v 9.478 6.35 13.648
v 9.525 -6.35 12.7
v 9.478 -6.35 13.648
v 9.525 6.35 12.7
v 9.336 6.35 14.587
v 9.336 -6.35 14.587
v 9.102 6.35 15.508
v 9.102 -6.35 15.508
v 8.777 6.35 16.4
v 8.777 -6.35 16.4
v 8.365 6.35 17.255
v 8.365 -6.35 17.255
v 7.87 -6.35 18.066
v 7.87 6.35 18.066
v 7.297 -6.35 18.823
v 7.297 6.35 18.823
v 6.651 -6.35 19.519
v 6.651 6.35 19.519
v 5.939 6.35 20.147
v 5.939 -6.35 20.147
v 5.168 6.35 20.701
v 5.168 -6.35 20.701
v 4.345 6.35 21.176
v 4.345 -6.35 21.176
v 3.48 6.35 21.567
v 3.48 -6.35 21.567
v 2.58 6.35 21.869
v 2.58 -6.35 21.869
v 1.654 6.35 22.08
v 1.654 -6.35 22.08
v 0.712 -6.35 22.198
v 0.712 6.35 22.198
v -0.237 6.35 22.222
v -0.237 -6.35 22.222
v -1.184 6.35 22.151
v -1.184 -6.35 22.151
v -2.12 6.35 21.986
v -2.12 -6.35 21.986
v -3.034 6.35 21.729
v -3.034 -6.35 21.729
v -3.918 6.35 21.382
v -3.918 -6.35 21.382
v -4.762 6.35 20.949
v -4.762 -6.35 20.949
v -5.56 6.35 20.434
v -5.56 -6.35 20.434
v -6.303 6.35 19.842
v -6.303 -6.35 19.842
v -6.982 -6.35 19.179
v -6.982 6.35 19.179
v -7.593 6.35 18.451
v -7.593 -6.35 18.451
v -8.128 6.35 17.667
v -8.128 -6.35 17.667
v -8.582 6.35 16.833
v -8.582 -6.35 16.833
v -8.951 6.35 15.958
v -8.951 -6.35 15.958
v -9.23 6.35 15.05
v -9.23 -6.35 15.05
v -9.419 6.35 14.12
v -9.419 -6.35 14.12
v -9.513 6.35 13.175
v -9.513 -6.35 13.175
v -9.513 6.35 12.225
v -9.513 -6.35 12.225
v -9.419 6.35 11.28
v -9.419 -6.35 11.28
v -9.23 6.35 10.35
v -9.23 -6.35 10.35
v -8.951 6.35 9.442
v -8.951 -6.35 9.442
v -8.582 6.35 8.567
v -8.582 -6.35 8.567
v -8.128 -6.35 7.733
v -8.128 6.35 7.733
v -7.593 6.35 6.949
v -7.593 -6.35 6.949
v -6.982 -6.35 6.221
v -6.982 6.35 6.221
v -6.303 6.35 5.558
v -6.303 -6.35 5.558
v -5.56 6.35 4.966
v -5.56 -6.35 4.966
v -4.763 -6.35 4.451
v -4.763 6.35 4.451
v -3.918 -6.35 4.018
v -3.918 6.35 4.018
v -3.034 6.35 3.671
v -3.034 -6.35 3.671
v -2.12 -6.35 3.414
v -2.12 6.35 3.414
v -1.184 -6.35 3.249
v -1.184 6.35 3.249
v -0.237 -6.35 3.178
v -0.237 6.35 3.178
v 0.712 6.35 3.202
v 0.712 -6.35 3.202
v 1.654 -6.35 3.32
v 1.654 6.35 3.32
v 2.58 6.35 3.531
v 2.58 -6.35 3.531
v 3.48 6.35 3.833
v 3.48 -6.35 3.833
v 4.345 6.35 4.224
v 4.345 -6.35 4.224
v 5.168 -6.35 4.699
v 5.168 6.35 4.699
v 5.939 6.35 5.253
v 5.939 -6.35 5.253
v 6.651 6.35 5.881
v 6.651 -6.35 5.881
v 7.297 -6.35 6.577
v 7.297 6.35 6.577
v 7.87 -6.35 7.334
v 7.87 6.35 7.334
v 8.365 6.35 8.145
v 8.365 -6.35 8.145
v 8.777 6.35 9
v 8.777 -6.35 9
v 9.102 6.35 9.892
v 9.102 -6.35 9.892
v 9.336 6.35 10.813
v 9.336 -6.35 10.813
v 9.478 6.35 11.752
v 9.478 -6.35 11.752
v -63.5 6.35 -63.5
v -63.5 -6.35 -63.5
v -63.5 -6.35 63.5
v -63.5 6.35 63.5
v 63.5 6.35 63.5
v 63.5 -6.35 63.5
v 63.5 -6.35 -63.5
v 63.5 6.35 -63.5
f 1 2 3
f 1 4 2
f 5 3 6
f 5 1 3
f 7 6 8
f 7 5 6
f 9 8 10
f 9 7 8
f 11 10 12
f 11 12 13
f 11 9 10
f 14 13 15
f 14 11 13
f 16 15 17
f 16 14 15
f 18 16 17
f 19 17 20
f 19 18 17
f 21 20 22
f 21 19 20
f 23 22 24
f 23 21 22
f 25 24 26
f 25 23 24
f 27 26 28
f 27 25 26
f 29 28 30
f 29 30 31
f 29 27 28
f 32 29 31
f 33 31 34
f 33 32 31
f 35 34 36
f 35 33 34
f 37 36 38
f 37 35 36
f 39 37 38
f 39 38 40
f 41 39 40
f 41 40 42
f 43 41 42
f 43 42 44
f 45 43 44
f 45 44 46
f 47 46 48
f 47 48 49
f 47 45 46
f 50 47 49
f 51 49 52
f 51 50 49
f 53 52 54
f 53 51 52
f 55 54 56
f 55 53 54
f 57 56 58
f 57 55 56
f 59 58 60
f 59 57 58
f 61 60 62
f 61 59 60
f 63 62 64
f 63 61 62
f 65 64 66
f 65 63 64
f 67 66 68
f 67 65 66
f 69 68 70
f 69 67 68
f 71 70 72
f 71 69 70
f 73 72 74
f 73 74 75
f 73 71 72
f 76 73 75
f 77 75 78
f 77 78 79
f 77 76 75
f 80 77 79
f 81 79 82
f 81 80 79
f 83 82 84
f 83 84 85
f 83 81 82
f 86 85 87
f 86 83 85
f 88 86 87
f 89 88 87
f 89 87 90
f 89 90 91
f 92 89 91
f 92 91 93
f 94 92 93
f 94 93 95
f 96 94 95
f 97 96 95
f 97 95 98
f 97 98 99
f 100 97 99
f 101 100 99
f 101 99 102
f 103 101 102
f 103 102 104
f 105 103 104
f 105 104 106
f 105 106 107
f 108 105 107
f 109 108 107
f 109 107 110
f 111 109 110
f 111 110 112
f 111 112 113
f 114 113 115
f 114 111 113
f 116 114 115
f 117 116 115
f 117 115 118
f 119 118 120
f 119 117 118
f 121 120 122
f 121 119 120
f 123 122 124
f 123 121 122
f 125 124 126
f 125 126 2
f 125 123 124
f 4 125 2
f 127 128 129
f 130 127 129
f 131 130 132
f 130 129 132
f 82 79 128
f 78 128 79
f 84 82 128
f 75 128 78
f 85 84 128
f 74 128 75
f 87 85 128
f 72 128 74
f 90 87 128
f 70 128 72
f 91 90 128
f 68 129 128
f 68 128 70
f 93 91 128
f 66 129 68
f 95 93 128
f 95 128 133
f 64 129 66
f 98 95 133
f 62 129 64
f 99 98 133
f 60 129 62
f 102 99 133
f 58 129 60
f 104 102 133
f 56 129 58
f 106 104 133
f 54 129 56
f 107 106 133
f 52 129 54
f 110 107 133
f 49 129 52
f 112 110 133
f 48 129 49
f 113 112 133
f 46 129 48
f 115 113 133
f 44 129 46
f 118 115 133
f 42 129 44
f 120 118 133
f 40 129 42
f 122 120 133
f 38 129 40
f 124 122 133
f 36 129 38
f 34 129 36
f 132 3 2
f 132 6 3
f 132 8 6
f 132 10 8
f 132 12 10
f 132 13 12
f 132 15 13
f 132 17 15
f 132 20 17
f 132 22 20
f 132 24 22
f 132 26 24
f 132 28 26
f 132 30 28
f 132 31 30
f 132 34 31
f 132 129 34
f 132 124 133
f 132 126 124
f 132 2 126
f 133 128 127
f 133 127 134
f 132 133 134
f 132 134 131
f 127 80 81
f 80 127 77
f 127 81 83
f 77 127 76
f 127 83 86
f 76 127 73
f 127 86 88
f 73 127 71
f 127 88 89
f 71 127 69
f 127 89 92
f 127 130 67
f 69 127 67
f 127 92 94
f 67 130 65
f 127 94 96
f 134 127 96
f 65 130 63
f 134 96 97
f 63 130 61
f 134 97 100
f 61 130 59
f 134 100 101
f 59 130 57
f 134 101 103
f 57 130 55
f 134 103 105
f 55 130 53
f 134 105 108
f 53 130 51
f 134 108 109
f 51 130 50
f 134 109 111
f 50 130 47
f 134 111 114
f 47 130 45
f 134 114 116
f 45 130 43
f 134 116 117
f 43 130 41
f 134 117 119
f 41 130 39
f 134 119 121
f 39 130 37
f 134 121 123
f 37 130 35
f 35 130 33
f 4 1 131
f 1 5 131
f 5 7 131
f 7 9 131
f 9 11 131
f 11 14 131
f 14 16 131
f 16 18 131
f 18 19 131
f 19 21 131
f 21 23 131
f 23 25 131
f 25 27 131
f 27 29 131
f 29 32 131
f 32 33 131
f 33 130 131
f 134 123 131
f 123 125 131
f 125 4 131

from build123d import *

# Parameters (mm, degrees)
F0_W     = 127
F0_H     = 127
F0_R     = 9.525
F1_DEPTH = 6.35


with BuildPart() as f1:
    # F0 (on Front) → F1 (new body, symmetric)
    with BuildSketch(Plane.XZ):
        Rectangle(F0_W, F0_H)
        with Locations((0, 12.7)):
            Circle(F0_R, mode=Mode.SUBTRACT)
    extrude(amount=F1_DEPTH, both=True)


solid = f1.part
